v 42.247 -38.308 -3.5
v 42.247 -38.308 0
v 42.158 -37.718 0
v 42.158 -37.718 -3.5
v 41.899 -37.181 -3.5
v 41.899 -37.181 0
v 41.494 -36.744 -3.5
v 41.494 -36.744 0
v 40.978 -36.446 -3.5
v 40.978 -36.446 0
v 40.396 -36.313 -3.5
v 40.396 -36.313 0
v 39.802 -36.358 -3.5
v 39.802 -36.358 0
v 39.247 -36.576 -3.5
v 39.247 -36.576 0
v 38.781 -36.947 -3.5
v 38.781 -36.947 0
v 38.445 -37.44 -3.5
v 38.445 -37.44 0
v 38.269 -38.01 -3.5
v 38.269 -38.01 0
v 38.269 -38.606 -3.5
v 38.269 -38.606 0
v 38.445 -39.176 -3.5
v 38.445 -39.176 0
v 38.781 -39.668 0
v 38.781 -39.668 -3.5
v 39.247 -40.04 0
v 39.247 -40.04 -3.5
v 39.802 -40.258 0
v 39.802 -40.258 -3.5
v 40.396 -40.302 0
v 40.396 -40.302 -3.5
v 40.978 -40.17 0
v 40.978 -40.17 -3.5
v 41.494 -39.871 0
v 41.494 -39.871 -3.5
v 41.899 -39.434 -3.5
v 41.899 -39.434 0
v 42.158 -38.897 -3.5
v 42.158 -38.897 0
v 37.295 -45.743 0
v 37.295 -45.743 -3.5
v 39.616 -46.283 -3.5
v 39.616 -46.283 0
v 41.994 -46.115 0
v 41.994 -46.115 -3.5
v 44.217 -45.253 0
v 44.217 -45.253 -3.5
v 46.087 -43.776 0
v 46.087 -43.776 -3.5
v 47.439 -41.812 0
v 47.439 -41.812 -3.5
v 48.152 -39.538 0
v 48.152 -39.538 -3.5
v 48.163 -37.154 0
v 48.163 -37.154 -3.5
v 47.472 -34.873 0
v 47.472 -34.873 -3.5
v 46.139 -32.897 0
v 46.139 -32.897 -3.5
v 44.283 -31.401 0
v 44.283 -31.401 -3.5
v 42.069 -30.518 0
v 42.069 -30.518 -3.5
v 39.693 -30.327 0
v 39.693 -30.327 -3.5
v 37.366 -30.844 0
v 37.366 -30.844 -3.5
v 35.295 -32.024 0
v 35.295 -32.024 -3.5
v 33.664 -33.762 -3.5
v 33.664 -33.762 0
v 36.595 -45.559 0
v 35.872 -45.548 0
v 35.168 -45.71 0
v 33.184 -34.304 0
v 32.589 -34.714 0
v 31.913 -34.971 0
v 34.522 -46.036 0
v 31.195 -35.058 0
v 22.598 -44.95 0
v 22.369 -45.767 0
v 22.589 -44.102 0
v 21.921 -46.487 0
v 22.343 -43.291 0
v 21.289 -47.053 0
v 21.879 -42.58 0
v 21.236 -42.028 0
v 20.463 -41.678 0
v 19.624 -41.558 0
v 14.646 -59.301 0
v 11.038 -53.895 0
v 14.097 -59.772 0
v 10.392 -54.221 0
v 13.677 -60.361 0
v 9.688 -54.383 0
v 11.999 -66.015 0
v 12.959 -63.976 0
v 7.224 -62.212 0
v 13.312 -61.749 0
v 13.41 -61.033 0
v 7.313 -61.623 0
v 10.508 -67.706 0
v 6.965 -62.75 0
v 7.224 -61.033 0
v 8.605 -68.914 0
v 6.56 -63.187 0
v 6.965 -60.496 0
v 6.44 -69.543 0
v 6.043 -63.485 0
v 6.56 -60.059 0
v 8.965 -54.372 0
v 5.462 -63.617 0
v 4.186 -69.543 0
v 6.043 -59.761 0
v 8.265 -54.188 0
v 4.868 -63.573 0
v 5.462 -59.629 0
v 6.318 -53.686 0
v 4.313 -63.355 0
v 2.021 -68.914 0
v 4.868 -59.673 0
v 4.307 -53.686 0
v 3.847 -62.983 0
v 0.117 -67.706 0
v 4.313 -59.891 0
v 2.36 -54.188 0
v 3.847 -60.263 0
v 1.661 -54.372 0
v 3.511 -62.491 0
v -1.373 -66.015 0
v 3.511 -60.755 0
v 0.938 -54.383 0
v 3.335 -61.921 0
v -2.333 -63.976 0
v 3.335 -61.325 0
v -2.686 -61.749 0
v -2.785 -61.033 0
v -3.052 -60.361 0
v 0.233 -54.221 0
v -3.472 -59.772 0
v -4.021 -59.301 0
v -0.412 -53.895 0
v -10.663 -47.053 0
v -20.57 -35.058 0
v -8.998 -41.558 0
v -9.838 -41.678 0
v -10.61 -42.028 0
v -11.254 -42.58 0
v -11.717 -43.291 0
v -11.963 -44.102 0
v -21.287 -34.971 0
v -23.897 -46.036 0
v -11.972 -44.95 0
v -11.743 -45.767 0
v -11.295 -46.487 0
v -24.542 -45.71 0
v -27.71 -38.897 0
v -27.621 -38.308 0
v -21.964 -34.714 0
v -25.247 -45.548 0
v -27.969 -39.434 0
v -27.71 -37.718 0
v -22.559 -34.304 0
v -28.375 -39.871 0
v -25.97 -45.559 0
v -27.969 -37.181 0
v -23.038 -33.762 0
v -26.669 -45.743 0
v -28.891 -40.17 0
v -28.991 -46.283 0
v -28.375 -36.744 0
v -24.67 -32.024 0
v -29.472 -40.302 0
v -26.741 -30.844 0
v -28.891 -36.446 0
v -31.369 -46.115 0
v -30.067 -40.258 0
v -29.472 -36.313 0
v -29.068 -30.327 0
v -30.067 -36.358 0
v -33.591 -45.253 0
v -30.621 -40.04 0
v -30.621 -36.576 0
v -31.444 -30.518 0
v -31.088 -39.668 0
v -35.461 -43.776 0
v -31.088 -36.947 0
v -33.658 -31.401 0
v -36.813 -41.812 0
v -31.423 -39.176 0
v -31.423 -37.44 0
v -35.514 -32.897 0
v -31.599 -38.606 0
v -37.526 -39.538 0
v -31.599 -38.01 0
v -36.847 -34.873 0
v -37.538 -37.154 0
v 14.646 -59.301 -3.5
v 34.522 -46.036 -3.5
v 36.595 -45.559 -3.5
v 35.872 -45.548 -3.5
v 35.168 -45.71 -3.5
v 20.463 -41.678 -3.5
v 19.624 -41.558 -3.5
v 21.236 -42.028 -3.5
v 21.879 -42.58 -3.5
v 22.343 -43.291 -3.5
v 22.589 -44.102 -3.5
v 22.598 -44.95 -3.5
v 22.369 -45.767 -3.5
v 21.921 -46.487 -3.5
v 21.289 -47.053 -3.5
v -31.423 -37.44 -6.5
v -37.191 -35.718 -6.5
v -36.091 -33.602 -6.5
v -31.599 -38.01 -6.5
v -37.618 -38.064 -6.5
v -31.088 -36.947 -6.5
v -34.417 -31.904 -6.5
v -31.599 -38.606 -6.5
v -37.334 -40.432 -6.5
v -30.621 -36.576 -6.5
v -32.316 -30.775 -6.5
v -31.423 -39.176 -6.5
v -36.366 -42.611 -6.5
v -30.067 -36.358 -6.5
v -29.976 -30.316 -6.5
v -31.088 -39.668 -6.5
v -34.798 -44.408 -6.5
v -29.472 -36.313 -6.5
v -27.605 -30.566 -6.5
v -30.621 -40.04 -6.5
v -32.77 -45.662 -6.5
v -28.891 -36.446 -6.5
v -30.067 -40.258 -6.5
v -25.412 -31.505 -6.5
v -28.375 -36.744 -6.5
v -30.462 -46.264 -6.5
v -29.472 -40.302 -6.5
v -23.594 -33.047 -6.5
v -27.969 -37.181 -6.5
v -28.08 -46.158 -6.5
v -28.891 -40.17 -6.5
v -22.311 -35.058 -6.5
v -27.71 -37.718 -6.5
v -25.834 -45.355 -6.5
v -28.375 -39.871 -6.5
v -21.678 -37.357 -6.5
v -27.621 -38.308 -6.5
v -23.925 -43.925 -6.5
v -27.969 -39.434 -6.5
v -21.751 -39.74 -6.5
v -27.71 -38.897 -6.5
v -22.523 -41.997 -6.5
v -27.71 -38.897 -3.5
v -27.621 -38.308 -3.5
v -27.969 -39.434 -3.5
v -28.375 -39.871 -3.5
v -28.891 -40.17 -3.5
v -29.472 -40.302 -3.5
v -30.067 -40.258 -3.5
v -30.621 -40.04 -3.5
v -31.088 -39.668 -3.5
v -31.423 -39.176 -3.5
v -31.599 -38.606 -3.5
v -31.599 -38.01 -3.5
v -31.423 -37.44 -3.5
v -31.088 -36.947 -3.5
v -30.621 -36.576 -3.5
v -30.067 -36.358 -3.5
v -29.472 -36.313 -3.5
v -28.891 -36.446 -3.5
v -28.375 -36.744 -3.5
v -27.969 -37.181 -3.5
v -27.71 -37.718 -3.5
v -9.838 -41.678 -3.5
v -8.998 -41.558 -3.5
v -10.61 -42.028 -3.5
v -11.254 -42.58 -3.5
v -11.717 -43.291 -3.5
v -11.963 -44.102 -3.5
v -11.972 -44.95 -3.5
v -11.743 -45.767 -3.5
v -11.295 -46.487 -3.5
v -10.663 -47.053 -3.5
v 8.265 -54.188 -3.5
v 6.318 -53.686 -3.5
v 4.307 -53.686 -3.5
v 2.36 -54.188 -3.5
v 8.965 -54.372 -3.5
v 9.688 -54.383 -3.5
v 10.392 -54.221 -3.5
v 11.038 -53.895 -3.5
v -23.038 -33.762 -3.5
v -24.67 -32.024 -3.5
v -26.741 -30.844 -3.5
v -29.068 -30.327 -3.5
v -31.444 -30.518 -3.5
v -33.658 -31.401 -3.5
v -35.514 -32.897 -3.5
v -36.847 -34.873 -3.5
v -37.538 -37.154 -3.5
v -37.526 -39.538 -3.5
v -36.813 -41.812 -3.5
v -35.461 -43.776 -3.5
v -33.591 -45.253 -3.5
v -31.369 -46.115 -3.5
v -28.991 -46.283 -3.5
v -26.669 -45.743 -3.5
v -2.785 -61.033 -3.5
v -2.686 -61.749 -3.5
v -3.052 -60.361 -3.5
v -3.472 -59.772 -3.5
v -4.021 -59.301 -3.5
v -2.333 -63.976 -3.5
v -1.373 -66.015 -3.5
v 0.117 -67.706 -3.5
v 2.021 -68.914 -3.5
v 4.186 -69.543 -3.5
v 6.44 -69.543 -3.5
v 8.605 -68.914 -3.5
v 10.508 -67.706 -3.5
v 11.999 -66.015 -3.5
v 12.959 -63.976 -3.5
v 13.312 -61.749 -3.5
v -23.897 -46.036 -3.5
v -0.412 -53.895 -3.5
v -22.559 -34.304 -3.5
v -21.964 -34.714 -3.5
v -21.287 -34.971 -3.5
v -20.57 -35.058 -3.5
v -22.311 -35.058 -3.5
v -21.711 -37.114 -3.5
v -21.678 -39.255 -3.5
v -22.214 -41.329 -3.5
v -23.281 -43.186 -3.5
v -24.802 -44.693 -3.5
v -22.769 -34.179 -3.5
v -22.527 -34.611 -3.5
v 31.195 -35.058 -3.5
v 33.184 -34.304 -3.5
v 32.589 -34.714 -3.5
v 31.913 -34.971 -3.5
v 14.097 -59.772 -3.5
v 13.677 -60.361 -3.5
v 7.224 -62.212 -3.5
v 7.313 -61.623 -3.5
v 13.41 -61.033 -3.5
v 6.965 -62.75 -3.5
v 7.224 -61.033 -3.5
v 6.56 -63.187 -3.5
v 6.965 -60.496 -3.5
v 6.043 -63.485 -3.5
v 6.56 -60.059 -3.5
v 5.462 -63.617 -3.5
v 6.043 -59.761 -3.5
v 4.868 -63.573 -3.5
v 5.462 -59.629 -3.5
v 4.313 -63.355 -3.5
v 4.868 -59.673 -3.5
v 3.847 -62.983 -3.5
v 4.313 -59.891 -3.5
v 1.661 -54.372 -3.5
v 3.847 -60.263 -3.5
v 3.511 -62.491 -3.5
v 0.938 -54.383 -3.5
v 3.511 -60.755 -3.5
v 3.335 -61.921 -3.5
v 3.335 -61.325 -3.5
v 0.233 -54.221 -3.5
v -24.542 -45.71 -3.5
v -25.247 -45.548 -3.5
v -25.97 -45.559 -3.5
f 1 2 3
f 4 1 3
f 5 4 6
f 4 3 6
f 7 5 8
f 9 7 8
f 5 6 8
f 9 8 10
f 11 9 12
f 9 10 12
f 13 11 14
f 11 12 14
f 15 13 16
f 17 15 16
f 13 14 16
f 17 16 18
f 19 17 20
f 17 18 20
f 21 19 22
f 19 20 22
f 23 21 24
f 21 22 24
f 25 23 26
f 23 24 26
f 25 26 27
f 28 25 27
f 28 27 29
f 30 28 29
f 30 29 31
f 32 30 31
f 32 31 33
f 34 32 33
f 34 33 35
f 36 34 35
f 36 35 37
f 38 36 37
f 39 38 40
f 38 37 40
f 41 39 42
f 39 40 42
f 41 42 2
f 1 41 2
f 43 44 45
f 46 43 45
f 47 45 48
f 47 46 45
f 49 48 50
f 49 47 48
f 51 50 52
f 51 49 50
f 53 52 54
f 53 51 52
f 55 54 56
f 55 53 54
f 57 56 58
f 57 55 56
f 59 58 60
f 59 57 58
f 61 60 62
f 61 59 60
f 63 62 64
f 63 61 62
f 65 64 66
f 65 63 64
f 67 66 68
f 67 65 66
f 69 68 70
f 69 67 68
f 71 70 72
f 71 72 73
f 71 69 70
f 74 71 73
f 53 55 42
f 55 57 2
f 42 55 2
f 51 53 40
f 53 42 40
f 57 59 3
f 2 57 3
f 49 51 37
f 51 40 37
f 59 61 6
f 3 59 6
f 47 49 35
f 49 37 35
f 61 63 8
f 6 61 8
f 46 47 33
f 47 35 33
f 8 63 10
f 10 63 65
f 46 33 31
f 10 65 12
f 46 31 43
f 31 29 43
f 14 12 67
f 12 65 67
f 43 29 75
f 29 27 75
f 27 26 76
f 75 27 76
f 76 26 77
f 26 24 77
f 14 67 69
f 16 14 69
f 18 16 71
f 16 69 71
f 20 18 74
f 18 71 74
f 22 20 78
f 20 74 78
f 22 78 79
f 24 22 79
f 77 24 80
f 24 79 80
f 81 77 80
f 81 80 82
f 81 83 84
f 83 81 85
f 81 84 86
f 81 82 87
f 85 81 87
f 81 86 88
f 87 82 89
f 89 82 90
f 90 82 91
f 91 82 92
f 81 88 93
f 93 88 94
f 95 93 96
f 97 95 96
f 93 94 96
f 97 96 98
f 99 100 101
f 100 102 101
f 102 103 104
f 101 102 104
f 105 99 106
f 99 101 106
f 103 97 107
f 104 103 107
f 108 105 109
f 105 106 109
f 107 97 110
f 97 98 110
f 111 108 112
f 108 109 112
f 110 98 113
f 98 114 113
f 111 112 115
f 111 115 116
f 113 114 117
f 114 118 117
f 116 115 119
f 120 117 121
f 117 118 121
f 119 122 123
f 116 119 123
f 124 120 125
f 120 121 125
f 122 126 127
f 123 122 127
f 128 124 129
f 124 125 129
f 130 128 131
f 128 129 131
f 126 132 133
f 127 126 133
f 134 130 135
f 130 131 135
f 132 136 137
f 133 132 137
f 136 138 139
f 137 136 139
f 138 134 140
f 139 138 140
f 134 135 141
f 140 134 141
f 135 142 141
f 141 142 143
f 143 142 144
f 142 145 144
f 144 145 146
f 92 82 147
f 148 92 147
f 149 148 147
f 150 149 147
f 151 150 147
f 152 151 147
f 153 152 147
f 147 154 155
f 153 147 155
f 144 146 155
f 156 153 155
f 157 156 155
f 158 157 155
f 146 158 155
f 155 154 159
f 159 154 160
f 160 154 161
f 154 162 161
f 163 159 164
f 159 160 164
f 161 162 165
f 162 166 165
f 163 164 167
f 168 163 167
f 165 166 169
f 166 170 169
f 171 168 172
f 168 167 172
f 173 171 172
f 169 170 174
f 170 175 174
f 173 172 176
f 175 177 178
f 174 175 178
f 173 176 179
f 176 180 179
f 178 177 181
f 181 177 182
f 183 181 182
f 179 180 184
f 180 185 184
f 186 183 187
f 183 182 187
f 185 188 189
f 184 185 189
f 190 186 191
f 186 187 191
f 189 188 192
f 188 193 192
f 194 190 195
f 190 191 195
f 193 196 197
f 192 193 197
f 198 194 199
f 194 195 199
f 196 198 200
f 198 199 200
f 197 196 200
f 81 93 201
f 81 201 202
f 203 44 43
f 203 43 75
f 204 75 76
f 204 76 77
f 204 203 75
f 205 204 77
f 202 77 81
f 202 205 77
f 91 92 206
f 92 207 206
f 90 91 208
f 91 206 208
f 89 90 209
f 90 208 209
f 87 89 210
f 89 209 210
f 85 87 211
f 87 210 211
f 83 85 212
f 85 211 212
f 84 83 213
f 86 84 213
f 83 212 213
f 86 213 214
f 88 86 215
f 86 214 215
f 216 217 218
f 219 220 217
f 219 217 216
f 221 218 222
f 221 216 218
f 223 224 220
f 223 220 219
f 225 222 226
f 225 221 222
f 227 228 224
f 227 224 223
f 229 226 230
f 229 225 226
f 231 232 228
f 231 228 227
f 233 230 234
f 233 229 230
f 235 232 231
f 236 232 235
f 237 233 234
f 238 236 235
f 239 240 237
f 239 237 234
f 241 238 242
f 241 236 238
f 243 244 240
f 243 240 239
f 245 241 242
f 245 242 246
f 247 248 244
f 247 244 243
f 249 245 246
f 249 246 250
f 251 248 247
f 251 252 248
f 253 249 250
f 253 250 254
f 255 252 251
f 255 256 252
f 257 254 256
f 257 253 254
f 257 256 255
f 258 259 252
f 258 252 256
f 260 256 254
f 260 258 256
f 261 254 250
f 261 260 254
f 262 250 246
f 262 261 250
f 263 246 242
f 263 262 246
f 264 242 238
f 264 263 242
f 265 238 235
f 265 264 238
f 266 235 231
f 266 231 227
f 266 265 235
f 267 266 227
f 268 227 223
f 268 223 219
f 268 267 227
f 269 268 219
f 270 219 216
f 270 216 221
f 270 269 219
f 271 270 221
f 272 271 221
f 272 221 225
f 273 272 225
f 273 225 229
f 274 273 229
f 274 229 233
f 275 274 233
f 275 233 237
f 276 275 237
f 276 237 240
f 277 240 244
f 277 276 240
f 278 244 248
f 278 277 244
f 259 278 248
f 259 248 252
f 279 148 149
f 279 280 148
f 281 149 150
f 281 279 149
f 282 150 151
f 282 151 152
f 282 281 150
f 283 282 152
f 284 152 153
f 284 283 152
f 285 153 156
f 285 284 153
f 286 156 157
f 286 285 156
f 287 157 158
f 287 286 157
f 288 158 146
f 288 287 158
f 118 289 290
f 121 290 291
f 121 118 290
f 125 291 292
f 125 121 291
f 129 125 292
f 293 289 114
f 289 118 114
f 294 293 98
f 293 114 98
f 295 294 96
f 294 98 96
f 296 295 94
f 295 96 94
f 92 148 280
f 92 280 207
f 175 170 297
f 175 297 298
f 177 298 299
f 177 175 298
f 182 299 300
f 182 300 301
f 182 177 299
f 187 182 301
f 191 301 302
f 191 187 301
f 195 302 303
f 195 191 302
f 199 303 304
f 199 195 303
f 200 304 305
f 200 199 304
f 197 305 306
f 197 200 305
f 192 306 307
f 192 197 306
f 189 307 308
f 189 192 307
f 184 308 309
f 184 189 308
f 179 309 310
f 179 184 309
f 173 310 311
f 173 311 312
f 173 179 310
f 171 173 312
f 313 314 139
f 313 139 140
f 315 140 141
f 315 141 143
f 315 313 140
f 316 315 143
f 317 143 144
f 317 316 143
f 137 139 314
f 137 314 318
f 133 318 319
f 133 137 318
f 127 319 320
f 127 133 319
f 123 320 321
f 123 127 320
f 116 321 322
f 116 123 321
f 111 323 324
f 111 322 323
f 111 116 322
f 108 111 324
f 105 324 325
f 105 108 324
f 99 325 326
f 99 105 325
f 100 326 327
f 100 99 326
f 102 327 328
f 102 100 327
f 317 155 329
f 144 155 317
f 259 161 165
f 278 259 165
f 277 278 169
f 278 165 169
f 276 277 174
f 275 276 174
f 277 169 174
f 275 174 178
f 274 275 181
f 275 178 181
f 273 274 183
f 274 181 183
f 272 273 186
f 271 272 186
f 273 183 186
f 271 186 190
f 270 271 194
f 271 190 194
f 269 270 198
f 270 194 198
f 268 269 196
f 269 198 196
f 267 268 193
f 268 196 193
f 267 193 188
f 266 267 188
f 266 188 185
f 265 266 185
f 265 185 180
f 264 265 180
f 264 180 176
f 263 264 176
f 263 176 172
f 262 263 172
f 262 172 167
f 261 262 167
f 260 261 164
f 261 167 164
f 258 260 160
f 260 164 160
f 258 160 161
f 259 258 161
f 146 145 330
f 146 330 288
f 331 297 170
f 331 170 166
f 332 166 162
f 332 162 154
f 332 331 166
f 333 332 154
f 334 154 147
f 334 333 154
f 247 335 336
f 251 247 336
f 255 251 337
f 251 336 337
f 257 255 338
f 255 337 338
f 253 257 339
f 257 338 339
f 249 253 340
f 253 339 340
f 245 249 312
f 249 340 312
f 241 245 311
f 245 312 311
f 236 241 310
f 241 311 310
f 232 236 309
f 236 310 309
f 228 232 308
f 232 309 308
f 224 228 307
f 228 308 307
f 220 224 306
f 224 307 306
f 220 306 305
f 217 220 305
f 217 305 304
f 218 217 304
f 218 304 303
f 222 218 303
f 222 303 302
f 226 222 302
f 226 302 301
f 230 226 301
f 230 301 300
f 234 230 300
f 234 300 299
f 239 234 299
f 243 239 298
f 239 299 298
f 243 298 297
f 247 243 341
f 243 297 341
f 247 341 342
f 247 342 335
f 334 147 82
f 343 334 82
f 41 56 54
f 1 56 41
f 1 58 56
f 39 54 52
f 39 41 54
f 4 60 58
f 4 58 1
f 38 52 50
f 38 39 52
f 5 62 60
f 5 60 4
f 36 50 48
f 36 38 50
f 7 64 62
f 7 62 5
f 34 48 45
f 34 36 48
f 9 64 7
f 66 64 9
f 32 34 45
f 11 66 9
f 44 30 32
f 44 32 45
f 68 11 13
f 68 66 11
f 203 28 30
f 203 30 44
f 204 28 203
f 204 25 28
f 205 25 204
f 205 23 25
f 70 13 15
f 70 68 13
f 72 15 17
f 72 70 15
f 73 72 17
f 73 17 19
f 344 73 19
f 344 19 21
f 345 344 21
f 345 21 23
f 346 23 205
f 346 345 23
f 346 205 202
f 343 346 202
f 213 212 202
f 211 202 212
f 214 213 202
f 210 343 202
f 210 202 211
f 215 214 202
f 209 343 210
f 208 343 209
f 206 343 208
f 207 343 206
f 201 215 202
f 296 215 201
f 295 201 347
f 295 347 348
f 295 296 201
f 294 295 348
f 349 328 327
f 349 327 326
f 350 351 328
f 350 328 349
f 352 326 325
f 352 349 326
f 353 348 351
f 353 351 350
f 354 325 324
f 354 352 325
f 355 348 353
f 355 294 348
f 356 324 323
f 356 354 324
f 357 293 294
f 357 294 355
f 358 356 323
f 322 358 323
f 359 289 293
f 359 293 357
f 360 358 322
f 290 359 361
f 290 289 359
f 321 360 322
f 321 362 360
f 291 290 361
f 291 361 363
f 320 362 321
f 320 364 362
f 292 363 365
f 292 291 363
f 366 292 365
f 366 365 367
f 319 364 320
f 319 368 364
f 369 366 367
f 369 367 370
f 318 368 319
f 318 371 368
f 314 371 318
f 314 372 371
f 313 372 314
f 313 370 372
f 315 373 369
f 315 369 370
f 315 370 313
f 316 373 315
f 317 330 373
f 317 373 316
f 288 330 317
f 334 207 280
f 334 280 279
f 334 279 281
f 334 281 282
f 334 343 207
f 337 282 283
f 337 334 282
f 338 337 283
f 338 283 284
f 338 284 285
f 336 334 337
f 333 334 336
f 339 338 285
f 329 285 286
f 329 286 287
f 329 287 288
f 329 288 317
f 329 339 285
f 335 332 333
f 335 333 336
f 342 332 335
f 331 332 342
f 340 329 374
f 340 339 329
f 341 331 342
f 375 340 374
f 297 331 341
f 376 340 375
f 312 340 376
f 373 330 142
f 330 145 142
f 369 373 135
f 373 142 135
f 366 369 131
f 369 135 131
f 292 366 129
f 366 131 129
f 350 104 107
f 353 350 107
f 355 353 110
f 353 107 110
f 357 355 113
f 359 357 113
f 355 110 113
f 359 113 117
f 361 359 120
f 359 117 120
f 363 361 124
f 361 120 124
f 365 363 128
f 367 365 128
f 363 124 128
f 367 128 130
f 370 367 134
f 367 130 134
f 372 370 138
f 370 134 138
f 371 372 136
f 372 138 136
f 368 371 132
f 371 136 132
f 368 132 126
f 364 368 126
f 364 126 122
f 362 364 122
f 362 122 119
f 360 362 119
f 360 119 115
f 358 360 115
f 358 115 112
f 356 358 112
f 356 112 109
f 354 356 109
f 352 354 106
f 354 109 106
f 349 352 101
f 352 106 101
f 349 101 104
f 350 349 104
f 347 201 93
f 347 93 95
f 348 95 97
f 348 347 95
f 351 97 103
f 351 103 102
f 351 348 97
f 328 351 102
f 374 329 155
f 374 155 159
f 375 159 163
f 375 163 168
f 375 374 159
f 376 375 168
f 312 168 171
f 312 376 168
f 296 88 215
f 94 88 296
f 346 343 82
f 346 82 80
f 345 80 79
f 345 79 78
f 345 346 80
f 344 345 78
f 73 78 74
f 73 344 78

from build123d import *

# Parameters (mm, degrees)
SKETCH1_R             = 8
SKETCH1_R_2           = 2
BOSS_EXTRUDE1_DEPTH   = 3.5
BOSS_EXTRUDE1_2_DEPTH = 3.5
BOSS_EXTRUDE1_3_DEPTH = 3.5
SKETCH4_W             = 60
SKETCH4_H             = 6.5
EXTRUDE_THIN1_DEPTH   = 3.5
FILLET1_R             = 3
SKETCH_1_R            = 8
SKETCH_1_R_2          = 2
EXTRUDE_1_DEPTH       = 3
FILLET_2_R            = 3


with BuildPart() as part:
    # Sketch1 → Boss-Extrude1 (new body)
    with BuildSketch(Plane.XY):
        with Locations((-29.621497739, -38.307799929)):
            Circle(SKETCH1_R)
        with Locations((-29.621497739, -38.307799929)):
            Circle(SKETCH1_R_2, mode=Mode.SUBTRACT)
    extrude(amount=-BOSS_EXTRUDE1_DEPTH)



with BuildPart() as body_2:
    # Sketch1 → Boss-Extrude1 2 (new body)
    with BuildSketch(Plane.XY):
        with Locations((40.247017363, -38.307799929)):
            Circle(SKETCH1_R)
        with Locations((40.247017363, -38.307799929)):
            Circle(SKETCH1_R_2, mode=Mode.SUBTRACT)
    extrude(amount=-BOSS_EXTRUDE1_2_DEPTH)


with BuildPart() as body_3:
    # Sketch1 → Boss-Extrude1 3 (new body)
    with BuildSketch(Plane.XY):
        with Locations((5.312759812, -61.622980593)):
            Circle(SKETCH1_R)
        with Locations((5.312759812, -61.622980593)):
            Circle(SKETCH1_R_2, mode=Mode.SUBTRACT)
    extrude(amount=-BOSS_EXTRUDE1_3_DEPTH)


with BuildPart() as part_1:
    add(part.part)

    add(body_2.part)  # Extrude-Thin1 merges body 2

    add(body_3.part)  # Extrude-Thin1 merges body 3
    # Sketch4 → Extrude-Thin1 (add)
    with BuildSketch(Plane.XY):
        with Locations((5.312759812, -38.307799929)):
            Rectangle(SKETCH4_W, SKETCH4_H)
        Polygon((-26.435040402, -44.341786144), (-1.481999294, -60.995486618), (2.126302475, -55.588994378), (-22.826738632, -38.935293904), align=None)
        Polygon((12.107518918, -60.995486618), (37.060560026, -44.341786144), (33.452258256, -38.935293904), (8.499217149, -55.588994378), align=None)
    extrude(amount=-EXTRUDE_THIN1_DEPTH)

    # Fillet1
    fillet1_edges = [part_1.edges().sort_by_distance(p)[0] for p in [
        (-18.897311611, -41.557799929, -1.75),
        (1.036606698, -54.861729633, -1.75),
        (9.588912926, -54.861729633, -1.75),
        (29.522831235, -41.557799929, -1.75),
    ]]
    fillet(fillet1_edges, radius=FILLET1_R)

    # 草图1 → 凸台-拉伸1 (add)
    with BuildSketch(Plane(origin=(0, 0, -3.5), x_dir=(-1, 0, 0), z_dir=(0, 0, -1))):
        with Locations(Location((29.621497739, -38.307799929, 0), (0, 0, 156.030517682))):
            Circle(SKETCH_1_R)
        with Locations(Location((29.621497739, -38.307799929, 0), (0, 0, 180))):
            Circle(SKETCH_1_R_2, mode=Mode.SUBTRACT)
    extrude(amount=EXTRUDE_1_DEPTH)

    # 圆角2
    # the kernel refuses this fillet: 3 mm, written as the material it adds along each edge
    with BuildSketch(Plane(origin=(-22.31140198, -35.057799929, -3.5), x_dir=(1, 0, 0), z_dir=(0, 0, 1)), Plane(origin=(-2.571695072, -60.268221873, -3.5), x_dir=(-0.8317680369208076, 0.5551233491368437, 0), z_dir=(0, 0, 1)), Plane(origin=(35.970864249, -45.069050889, -3.5), x_dir=(-0.8317680369208071, -0.5551233491368445, 0), z_dir=(0, 0, 1))) as fillet_2_piece_1:
        with BuildLine():
            CenterArc((1.741837737, 3), FILLET_2_R, 214.623535479, 55.376464521)
            ThreePointArc((-0.726871399, 1.295454545), (-0.333303043, 0.664634517), (0, 0))
            Line((0, 0), (1.741837737, 0))
        make_face()
    extrude(amount=3.5)
    with BuildSketch(Plane(origin=(32.936921604, -35.057799929, -3.5), x_dir=(0.4893293145989847, 0.8720990894812859, 0), z_dir=(0, 0, 1)), Plane(origin=(-25.345344625, -45.069050889, -3.5), x_dir=(-0.8911310507438419, -0.45374601970725476, 0), z_dir=(0, 0, 1))) as fillet_2_piece_2:
        with BuildLine():
            CenterArc((1.763965003, 2.987043048), FILLET_2_R, 209.296508898, 55.376464521)
            Line((-0.852332266, 1.519055104), (0, 0))
            ThreePointArc((0, 0), (0.742722106, 0.034551872), (1.485444213, 0))
        make_face()
    extrude(amount=3.5)
    with BuildSketch(Plane(origin=(13.197214696, -60.268221873, -3.5), x_dir=(0.8317680369208036, 0.5551233491368496, 0), z_dir=(0, 0, 1))) as fillet_2_piece_3:
        with BuildLine():
            CenterArc((1.741837737, -3), FILLET_2_R, 90, 55.376464521)
            ThreePointArc((-0.726871399, -1.295454545), (-0.333303043, -0.664634517), (0, 0))
            Line((0, 0), (1.741837737, 0))
        make_face()
    extrude(amount=3.5)


solid = part_1.part
